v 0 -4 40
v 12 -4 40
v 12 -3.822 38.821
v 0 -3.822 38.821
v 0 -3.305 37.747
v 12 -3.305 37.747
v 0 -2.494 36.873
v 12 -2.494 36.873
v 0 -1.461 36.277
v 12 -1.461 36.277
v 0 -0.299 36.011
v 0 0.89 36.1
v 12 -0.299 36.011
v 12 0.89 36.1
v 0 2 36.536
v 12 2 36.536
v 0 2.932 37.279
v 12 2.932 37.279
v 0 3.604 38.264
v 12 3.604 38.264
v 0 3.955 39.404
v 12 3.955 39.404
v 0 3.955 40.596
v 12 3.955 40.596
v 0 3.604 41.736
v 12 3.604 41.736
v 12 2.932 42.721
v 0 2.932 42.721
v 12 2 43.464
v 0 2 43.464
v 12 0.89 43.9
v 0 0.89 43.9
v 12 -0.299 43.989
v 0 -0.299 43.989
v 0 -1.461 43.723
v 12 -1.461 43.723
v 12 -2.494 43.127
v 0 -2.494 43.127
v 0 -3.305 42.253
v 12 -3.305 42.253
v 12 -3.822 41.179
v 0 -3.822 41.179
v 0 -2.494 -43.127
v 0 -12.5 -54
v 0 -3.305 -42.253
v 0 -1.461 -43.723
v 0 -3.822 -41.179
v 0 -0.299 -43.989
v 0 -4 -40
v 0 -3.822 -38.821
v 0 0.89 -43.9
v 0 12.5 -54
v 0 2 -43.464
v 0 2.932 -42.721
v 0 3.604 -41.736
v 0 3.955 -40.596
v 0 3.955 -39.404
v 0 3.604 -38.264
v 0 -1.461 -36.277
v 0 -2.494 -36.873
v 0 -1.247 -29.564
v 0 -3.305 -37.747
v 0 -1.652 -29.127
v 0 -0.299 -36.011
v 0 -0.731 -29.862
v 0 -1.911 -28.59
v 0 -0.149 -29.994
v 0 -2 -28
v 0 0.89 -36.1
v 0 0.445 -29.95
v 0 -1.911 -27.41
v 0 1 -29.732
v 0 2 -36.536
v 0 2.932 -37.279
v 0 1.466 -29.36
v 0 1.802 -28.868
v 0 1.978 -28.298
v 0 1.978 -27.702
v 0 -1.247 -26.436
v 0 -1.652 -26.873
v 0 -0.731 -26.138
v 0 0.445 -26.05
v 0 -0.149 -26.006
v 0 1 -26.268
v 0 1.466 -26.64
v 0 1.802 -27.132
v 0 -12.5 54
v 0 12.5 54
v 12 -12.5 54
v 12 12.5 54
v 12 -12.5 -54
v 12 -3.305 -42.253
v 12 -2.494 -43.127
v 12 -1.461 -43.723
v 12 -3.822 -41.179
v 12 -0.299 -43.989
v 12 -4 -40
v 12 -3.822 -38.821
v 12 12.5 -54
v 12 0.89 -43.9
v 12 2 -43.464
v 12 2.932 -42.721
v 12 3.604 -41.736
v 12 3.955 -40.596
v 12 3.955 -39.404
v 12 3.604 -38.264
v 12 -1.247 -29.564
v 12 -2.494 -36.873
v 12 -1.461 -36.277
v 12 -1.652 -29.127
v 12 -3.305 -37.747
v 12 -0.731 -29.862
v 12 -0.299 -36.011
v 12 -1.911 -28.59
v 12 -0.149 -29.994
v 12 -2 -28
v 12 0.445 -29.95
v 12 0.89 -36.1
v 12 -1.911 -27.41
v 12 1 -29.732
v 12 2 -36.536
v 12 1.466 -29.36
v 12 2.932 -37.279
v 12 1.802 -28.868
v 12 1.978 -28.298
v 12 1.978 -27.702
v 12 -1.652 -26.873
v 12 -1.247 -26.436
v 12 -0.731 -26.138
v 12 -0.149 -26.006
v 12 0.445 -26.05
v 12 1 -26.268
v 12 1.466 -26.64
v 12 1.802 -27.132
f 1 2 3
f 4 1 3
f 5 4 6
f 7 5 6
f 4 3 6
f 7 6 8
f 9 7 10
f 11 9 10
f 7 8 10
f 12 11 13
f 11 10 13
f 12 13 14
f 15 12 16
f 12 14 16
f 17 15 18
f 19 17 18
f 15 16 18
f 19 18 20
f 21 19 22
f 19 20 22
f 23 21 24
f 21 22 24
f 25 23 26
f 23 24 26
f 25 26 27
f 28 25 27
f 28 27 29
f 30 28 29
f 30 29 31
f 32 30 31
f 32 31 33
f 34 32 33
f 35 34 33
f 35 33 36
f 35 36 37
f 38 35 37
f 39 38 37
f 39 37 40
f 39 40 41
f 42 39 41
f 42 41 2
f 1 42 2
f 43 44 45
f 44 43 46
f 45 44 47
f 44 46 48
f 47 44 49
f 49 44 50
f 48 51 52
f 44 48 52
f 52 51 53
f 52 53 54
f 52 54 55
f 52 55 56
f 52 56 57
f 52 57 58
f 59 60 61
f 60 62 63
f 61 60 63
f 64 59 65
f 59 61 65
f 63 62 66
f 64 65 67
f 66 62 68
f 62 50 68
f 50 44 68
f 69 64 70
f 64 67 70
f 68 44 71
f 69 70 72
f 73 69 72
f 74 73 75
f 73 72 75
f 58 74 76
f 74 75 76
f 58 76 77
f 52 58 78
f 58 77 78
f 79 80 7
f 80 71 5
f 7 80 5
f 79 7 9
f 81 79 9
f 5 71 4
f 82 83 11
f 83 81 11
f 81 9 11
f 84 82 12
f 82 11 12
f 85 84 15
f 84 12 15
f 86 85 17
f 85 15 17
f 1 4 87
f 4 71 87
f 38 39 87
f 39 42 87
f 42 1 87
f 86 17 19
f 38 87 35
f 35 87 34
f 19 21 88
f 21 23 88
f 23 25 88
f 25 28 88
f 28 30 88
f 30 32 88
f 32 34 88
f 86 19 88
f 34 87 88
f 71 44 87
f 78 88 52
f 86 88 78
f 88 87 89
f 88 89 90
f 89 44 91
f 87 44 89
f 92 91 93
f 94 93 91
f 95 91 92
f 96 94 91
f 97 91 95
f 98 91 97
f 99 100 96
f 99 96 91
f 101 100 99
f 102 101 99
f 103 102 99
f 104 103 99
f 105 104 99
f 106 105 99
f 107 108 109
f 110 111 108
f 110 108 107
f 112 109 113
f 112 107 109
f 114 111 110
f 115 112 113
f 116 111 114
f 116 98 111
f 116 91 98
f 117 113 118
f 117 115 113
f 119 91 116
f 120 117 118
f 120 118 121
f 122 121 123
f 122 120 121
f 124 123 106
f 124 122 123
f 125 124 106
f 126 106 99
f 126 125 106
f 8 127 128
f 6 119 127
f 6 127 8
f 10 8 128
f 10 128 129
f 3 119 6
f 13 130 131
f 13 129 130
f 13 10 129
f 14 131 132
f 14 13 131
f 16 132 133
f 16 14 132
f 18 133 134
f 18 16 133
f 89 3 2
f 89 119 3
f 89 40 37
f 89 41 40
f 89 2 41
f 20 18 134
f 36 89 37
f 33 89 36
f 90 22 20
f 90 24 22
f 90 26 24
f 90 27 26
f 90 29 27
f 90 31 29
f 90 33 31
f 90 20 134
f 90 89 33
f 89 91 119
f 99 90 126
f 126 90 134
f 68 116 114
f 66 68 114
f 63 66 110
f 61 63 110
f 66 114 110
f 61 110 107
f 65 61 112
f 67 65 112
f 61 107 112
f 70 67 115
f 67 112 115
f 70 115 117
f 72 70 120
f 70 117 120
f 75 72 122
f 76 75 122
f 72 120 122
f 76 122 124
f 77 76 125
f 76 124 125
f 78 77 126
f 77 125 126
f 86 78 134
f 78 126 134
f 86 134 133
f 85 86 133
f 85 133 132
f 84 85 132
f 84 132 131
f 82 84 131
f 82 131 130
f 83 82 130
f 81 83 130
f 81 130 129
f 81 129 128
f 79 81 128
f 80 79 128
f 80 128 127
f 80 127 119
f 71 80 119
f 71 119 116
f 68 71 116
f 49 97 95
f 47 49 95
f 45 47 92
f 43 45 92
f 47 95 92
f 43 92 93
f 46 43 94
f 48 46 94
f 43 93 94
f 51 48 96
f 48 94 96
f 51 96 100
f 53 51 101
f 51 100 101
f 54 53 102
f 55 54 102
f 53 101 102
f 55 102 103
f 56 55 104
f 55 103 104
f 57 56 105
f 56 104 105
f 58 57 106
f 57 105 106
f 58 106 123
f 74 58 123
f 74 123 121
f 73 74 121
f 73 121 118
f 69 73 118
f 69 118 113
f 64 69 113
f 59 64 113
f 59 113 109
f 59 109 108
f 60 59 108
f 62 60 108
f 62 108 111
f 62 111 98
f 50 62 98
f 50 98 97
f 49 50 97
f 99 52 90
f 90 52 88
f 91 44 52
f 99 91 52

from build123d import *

# Parameters (mm, degrees)
F0_W     = 25
F0_H     = 108
F1_DEPTH = 12
F2_D     = 8
F3_D     = 4


with BuildPart() as f1:
    # F0 (on Right) → F1 (new body)
    with BuildSketch(Plane.YZ):
        Rectangle(F0_W, F0_H)
    extrude(amount=F1_DEPTH)

    # F2 (through all)
    with Locations(Plane(origin=(0, 0, 0), x_dir=(0, 1, 0), z_dir=(-1, 0, 0))):
        with Locations((0, -40), (0, 40)):
            Hole(F2_D / 2)

    # F3 (through all)
    with Locations(Plane(origin=(0, 0, 0), x_dir=(0, 1, 0), z_dir=(-1, 0, 0))):
        with Locations((0, 28)):
            Hole(F3_D / 2)


solid = f1.part
